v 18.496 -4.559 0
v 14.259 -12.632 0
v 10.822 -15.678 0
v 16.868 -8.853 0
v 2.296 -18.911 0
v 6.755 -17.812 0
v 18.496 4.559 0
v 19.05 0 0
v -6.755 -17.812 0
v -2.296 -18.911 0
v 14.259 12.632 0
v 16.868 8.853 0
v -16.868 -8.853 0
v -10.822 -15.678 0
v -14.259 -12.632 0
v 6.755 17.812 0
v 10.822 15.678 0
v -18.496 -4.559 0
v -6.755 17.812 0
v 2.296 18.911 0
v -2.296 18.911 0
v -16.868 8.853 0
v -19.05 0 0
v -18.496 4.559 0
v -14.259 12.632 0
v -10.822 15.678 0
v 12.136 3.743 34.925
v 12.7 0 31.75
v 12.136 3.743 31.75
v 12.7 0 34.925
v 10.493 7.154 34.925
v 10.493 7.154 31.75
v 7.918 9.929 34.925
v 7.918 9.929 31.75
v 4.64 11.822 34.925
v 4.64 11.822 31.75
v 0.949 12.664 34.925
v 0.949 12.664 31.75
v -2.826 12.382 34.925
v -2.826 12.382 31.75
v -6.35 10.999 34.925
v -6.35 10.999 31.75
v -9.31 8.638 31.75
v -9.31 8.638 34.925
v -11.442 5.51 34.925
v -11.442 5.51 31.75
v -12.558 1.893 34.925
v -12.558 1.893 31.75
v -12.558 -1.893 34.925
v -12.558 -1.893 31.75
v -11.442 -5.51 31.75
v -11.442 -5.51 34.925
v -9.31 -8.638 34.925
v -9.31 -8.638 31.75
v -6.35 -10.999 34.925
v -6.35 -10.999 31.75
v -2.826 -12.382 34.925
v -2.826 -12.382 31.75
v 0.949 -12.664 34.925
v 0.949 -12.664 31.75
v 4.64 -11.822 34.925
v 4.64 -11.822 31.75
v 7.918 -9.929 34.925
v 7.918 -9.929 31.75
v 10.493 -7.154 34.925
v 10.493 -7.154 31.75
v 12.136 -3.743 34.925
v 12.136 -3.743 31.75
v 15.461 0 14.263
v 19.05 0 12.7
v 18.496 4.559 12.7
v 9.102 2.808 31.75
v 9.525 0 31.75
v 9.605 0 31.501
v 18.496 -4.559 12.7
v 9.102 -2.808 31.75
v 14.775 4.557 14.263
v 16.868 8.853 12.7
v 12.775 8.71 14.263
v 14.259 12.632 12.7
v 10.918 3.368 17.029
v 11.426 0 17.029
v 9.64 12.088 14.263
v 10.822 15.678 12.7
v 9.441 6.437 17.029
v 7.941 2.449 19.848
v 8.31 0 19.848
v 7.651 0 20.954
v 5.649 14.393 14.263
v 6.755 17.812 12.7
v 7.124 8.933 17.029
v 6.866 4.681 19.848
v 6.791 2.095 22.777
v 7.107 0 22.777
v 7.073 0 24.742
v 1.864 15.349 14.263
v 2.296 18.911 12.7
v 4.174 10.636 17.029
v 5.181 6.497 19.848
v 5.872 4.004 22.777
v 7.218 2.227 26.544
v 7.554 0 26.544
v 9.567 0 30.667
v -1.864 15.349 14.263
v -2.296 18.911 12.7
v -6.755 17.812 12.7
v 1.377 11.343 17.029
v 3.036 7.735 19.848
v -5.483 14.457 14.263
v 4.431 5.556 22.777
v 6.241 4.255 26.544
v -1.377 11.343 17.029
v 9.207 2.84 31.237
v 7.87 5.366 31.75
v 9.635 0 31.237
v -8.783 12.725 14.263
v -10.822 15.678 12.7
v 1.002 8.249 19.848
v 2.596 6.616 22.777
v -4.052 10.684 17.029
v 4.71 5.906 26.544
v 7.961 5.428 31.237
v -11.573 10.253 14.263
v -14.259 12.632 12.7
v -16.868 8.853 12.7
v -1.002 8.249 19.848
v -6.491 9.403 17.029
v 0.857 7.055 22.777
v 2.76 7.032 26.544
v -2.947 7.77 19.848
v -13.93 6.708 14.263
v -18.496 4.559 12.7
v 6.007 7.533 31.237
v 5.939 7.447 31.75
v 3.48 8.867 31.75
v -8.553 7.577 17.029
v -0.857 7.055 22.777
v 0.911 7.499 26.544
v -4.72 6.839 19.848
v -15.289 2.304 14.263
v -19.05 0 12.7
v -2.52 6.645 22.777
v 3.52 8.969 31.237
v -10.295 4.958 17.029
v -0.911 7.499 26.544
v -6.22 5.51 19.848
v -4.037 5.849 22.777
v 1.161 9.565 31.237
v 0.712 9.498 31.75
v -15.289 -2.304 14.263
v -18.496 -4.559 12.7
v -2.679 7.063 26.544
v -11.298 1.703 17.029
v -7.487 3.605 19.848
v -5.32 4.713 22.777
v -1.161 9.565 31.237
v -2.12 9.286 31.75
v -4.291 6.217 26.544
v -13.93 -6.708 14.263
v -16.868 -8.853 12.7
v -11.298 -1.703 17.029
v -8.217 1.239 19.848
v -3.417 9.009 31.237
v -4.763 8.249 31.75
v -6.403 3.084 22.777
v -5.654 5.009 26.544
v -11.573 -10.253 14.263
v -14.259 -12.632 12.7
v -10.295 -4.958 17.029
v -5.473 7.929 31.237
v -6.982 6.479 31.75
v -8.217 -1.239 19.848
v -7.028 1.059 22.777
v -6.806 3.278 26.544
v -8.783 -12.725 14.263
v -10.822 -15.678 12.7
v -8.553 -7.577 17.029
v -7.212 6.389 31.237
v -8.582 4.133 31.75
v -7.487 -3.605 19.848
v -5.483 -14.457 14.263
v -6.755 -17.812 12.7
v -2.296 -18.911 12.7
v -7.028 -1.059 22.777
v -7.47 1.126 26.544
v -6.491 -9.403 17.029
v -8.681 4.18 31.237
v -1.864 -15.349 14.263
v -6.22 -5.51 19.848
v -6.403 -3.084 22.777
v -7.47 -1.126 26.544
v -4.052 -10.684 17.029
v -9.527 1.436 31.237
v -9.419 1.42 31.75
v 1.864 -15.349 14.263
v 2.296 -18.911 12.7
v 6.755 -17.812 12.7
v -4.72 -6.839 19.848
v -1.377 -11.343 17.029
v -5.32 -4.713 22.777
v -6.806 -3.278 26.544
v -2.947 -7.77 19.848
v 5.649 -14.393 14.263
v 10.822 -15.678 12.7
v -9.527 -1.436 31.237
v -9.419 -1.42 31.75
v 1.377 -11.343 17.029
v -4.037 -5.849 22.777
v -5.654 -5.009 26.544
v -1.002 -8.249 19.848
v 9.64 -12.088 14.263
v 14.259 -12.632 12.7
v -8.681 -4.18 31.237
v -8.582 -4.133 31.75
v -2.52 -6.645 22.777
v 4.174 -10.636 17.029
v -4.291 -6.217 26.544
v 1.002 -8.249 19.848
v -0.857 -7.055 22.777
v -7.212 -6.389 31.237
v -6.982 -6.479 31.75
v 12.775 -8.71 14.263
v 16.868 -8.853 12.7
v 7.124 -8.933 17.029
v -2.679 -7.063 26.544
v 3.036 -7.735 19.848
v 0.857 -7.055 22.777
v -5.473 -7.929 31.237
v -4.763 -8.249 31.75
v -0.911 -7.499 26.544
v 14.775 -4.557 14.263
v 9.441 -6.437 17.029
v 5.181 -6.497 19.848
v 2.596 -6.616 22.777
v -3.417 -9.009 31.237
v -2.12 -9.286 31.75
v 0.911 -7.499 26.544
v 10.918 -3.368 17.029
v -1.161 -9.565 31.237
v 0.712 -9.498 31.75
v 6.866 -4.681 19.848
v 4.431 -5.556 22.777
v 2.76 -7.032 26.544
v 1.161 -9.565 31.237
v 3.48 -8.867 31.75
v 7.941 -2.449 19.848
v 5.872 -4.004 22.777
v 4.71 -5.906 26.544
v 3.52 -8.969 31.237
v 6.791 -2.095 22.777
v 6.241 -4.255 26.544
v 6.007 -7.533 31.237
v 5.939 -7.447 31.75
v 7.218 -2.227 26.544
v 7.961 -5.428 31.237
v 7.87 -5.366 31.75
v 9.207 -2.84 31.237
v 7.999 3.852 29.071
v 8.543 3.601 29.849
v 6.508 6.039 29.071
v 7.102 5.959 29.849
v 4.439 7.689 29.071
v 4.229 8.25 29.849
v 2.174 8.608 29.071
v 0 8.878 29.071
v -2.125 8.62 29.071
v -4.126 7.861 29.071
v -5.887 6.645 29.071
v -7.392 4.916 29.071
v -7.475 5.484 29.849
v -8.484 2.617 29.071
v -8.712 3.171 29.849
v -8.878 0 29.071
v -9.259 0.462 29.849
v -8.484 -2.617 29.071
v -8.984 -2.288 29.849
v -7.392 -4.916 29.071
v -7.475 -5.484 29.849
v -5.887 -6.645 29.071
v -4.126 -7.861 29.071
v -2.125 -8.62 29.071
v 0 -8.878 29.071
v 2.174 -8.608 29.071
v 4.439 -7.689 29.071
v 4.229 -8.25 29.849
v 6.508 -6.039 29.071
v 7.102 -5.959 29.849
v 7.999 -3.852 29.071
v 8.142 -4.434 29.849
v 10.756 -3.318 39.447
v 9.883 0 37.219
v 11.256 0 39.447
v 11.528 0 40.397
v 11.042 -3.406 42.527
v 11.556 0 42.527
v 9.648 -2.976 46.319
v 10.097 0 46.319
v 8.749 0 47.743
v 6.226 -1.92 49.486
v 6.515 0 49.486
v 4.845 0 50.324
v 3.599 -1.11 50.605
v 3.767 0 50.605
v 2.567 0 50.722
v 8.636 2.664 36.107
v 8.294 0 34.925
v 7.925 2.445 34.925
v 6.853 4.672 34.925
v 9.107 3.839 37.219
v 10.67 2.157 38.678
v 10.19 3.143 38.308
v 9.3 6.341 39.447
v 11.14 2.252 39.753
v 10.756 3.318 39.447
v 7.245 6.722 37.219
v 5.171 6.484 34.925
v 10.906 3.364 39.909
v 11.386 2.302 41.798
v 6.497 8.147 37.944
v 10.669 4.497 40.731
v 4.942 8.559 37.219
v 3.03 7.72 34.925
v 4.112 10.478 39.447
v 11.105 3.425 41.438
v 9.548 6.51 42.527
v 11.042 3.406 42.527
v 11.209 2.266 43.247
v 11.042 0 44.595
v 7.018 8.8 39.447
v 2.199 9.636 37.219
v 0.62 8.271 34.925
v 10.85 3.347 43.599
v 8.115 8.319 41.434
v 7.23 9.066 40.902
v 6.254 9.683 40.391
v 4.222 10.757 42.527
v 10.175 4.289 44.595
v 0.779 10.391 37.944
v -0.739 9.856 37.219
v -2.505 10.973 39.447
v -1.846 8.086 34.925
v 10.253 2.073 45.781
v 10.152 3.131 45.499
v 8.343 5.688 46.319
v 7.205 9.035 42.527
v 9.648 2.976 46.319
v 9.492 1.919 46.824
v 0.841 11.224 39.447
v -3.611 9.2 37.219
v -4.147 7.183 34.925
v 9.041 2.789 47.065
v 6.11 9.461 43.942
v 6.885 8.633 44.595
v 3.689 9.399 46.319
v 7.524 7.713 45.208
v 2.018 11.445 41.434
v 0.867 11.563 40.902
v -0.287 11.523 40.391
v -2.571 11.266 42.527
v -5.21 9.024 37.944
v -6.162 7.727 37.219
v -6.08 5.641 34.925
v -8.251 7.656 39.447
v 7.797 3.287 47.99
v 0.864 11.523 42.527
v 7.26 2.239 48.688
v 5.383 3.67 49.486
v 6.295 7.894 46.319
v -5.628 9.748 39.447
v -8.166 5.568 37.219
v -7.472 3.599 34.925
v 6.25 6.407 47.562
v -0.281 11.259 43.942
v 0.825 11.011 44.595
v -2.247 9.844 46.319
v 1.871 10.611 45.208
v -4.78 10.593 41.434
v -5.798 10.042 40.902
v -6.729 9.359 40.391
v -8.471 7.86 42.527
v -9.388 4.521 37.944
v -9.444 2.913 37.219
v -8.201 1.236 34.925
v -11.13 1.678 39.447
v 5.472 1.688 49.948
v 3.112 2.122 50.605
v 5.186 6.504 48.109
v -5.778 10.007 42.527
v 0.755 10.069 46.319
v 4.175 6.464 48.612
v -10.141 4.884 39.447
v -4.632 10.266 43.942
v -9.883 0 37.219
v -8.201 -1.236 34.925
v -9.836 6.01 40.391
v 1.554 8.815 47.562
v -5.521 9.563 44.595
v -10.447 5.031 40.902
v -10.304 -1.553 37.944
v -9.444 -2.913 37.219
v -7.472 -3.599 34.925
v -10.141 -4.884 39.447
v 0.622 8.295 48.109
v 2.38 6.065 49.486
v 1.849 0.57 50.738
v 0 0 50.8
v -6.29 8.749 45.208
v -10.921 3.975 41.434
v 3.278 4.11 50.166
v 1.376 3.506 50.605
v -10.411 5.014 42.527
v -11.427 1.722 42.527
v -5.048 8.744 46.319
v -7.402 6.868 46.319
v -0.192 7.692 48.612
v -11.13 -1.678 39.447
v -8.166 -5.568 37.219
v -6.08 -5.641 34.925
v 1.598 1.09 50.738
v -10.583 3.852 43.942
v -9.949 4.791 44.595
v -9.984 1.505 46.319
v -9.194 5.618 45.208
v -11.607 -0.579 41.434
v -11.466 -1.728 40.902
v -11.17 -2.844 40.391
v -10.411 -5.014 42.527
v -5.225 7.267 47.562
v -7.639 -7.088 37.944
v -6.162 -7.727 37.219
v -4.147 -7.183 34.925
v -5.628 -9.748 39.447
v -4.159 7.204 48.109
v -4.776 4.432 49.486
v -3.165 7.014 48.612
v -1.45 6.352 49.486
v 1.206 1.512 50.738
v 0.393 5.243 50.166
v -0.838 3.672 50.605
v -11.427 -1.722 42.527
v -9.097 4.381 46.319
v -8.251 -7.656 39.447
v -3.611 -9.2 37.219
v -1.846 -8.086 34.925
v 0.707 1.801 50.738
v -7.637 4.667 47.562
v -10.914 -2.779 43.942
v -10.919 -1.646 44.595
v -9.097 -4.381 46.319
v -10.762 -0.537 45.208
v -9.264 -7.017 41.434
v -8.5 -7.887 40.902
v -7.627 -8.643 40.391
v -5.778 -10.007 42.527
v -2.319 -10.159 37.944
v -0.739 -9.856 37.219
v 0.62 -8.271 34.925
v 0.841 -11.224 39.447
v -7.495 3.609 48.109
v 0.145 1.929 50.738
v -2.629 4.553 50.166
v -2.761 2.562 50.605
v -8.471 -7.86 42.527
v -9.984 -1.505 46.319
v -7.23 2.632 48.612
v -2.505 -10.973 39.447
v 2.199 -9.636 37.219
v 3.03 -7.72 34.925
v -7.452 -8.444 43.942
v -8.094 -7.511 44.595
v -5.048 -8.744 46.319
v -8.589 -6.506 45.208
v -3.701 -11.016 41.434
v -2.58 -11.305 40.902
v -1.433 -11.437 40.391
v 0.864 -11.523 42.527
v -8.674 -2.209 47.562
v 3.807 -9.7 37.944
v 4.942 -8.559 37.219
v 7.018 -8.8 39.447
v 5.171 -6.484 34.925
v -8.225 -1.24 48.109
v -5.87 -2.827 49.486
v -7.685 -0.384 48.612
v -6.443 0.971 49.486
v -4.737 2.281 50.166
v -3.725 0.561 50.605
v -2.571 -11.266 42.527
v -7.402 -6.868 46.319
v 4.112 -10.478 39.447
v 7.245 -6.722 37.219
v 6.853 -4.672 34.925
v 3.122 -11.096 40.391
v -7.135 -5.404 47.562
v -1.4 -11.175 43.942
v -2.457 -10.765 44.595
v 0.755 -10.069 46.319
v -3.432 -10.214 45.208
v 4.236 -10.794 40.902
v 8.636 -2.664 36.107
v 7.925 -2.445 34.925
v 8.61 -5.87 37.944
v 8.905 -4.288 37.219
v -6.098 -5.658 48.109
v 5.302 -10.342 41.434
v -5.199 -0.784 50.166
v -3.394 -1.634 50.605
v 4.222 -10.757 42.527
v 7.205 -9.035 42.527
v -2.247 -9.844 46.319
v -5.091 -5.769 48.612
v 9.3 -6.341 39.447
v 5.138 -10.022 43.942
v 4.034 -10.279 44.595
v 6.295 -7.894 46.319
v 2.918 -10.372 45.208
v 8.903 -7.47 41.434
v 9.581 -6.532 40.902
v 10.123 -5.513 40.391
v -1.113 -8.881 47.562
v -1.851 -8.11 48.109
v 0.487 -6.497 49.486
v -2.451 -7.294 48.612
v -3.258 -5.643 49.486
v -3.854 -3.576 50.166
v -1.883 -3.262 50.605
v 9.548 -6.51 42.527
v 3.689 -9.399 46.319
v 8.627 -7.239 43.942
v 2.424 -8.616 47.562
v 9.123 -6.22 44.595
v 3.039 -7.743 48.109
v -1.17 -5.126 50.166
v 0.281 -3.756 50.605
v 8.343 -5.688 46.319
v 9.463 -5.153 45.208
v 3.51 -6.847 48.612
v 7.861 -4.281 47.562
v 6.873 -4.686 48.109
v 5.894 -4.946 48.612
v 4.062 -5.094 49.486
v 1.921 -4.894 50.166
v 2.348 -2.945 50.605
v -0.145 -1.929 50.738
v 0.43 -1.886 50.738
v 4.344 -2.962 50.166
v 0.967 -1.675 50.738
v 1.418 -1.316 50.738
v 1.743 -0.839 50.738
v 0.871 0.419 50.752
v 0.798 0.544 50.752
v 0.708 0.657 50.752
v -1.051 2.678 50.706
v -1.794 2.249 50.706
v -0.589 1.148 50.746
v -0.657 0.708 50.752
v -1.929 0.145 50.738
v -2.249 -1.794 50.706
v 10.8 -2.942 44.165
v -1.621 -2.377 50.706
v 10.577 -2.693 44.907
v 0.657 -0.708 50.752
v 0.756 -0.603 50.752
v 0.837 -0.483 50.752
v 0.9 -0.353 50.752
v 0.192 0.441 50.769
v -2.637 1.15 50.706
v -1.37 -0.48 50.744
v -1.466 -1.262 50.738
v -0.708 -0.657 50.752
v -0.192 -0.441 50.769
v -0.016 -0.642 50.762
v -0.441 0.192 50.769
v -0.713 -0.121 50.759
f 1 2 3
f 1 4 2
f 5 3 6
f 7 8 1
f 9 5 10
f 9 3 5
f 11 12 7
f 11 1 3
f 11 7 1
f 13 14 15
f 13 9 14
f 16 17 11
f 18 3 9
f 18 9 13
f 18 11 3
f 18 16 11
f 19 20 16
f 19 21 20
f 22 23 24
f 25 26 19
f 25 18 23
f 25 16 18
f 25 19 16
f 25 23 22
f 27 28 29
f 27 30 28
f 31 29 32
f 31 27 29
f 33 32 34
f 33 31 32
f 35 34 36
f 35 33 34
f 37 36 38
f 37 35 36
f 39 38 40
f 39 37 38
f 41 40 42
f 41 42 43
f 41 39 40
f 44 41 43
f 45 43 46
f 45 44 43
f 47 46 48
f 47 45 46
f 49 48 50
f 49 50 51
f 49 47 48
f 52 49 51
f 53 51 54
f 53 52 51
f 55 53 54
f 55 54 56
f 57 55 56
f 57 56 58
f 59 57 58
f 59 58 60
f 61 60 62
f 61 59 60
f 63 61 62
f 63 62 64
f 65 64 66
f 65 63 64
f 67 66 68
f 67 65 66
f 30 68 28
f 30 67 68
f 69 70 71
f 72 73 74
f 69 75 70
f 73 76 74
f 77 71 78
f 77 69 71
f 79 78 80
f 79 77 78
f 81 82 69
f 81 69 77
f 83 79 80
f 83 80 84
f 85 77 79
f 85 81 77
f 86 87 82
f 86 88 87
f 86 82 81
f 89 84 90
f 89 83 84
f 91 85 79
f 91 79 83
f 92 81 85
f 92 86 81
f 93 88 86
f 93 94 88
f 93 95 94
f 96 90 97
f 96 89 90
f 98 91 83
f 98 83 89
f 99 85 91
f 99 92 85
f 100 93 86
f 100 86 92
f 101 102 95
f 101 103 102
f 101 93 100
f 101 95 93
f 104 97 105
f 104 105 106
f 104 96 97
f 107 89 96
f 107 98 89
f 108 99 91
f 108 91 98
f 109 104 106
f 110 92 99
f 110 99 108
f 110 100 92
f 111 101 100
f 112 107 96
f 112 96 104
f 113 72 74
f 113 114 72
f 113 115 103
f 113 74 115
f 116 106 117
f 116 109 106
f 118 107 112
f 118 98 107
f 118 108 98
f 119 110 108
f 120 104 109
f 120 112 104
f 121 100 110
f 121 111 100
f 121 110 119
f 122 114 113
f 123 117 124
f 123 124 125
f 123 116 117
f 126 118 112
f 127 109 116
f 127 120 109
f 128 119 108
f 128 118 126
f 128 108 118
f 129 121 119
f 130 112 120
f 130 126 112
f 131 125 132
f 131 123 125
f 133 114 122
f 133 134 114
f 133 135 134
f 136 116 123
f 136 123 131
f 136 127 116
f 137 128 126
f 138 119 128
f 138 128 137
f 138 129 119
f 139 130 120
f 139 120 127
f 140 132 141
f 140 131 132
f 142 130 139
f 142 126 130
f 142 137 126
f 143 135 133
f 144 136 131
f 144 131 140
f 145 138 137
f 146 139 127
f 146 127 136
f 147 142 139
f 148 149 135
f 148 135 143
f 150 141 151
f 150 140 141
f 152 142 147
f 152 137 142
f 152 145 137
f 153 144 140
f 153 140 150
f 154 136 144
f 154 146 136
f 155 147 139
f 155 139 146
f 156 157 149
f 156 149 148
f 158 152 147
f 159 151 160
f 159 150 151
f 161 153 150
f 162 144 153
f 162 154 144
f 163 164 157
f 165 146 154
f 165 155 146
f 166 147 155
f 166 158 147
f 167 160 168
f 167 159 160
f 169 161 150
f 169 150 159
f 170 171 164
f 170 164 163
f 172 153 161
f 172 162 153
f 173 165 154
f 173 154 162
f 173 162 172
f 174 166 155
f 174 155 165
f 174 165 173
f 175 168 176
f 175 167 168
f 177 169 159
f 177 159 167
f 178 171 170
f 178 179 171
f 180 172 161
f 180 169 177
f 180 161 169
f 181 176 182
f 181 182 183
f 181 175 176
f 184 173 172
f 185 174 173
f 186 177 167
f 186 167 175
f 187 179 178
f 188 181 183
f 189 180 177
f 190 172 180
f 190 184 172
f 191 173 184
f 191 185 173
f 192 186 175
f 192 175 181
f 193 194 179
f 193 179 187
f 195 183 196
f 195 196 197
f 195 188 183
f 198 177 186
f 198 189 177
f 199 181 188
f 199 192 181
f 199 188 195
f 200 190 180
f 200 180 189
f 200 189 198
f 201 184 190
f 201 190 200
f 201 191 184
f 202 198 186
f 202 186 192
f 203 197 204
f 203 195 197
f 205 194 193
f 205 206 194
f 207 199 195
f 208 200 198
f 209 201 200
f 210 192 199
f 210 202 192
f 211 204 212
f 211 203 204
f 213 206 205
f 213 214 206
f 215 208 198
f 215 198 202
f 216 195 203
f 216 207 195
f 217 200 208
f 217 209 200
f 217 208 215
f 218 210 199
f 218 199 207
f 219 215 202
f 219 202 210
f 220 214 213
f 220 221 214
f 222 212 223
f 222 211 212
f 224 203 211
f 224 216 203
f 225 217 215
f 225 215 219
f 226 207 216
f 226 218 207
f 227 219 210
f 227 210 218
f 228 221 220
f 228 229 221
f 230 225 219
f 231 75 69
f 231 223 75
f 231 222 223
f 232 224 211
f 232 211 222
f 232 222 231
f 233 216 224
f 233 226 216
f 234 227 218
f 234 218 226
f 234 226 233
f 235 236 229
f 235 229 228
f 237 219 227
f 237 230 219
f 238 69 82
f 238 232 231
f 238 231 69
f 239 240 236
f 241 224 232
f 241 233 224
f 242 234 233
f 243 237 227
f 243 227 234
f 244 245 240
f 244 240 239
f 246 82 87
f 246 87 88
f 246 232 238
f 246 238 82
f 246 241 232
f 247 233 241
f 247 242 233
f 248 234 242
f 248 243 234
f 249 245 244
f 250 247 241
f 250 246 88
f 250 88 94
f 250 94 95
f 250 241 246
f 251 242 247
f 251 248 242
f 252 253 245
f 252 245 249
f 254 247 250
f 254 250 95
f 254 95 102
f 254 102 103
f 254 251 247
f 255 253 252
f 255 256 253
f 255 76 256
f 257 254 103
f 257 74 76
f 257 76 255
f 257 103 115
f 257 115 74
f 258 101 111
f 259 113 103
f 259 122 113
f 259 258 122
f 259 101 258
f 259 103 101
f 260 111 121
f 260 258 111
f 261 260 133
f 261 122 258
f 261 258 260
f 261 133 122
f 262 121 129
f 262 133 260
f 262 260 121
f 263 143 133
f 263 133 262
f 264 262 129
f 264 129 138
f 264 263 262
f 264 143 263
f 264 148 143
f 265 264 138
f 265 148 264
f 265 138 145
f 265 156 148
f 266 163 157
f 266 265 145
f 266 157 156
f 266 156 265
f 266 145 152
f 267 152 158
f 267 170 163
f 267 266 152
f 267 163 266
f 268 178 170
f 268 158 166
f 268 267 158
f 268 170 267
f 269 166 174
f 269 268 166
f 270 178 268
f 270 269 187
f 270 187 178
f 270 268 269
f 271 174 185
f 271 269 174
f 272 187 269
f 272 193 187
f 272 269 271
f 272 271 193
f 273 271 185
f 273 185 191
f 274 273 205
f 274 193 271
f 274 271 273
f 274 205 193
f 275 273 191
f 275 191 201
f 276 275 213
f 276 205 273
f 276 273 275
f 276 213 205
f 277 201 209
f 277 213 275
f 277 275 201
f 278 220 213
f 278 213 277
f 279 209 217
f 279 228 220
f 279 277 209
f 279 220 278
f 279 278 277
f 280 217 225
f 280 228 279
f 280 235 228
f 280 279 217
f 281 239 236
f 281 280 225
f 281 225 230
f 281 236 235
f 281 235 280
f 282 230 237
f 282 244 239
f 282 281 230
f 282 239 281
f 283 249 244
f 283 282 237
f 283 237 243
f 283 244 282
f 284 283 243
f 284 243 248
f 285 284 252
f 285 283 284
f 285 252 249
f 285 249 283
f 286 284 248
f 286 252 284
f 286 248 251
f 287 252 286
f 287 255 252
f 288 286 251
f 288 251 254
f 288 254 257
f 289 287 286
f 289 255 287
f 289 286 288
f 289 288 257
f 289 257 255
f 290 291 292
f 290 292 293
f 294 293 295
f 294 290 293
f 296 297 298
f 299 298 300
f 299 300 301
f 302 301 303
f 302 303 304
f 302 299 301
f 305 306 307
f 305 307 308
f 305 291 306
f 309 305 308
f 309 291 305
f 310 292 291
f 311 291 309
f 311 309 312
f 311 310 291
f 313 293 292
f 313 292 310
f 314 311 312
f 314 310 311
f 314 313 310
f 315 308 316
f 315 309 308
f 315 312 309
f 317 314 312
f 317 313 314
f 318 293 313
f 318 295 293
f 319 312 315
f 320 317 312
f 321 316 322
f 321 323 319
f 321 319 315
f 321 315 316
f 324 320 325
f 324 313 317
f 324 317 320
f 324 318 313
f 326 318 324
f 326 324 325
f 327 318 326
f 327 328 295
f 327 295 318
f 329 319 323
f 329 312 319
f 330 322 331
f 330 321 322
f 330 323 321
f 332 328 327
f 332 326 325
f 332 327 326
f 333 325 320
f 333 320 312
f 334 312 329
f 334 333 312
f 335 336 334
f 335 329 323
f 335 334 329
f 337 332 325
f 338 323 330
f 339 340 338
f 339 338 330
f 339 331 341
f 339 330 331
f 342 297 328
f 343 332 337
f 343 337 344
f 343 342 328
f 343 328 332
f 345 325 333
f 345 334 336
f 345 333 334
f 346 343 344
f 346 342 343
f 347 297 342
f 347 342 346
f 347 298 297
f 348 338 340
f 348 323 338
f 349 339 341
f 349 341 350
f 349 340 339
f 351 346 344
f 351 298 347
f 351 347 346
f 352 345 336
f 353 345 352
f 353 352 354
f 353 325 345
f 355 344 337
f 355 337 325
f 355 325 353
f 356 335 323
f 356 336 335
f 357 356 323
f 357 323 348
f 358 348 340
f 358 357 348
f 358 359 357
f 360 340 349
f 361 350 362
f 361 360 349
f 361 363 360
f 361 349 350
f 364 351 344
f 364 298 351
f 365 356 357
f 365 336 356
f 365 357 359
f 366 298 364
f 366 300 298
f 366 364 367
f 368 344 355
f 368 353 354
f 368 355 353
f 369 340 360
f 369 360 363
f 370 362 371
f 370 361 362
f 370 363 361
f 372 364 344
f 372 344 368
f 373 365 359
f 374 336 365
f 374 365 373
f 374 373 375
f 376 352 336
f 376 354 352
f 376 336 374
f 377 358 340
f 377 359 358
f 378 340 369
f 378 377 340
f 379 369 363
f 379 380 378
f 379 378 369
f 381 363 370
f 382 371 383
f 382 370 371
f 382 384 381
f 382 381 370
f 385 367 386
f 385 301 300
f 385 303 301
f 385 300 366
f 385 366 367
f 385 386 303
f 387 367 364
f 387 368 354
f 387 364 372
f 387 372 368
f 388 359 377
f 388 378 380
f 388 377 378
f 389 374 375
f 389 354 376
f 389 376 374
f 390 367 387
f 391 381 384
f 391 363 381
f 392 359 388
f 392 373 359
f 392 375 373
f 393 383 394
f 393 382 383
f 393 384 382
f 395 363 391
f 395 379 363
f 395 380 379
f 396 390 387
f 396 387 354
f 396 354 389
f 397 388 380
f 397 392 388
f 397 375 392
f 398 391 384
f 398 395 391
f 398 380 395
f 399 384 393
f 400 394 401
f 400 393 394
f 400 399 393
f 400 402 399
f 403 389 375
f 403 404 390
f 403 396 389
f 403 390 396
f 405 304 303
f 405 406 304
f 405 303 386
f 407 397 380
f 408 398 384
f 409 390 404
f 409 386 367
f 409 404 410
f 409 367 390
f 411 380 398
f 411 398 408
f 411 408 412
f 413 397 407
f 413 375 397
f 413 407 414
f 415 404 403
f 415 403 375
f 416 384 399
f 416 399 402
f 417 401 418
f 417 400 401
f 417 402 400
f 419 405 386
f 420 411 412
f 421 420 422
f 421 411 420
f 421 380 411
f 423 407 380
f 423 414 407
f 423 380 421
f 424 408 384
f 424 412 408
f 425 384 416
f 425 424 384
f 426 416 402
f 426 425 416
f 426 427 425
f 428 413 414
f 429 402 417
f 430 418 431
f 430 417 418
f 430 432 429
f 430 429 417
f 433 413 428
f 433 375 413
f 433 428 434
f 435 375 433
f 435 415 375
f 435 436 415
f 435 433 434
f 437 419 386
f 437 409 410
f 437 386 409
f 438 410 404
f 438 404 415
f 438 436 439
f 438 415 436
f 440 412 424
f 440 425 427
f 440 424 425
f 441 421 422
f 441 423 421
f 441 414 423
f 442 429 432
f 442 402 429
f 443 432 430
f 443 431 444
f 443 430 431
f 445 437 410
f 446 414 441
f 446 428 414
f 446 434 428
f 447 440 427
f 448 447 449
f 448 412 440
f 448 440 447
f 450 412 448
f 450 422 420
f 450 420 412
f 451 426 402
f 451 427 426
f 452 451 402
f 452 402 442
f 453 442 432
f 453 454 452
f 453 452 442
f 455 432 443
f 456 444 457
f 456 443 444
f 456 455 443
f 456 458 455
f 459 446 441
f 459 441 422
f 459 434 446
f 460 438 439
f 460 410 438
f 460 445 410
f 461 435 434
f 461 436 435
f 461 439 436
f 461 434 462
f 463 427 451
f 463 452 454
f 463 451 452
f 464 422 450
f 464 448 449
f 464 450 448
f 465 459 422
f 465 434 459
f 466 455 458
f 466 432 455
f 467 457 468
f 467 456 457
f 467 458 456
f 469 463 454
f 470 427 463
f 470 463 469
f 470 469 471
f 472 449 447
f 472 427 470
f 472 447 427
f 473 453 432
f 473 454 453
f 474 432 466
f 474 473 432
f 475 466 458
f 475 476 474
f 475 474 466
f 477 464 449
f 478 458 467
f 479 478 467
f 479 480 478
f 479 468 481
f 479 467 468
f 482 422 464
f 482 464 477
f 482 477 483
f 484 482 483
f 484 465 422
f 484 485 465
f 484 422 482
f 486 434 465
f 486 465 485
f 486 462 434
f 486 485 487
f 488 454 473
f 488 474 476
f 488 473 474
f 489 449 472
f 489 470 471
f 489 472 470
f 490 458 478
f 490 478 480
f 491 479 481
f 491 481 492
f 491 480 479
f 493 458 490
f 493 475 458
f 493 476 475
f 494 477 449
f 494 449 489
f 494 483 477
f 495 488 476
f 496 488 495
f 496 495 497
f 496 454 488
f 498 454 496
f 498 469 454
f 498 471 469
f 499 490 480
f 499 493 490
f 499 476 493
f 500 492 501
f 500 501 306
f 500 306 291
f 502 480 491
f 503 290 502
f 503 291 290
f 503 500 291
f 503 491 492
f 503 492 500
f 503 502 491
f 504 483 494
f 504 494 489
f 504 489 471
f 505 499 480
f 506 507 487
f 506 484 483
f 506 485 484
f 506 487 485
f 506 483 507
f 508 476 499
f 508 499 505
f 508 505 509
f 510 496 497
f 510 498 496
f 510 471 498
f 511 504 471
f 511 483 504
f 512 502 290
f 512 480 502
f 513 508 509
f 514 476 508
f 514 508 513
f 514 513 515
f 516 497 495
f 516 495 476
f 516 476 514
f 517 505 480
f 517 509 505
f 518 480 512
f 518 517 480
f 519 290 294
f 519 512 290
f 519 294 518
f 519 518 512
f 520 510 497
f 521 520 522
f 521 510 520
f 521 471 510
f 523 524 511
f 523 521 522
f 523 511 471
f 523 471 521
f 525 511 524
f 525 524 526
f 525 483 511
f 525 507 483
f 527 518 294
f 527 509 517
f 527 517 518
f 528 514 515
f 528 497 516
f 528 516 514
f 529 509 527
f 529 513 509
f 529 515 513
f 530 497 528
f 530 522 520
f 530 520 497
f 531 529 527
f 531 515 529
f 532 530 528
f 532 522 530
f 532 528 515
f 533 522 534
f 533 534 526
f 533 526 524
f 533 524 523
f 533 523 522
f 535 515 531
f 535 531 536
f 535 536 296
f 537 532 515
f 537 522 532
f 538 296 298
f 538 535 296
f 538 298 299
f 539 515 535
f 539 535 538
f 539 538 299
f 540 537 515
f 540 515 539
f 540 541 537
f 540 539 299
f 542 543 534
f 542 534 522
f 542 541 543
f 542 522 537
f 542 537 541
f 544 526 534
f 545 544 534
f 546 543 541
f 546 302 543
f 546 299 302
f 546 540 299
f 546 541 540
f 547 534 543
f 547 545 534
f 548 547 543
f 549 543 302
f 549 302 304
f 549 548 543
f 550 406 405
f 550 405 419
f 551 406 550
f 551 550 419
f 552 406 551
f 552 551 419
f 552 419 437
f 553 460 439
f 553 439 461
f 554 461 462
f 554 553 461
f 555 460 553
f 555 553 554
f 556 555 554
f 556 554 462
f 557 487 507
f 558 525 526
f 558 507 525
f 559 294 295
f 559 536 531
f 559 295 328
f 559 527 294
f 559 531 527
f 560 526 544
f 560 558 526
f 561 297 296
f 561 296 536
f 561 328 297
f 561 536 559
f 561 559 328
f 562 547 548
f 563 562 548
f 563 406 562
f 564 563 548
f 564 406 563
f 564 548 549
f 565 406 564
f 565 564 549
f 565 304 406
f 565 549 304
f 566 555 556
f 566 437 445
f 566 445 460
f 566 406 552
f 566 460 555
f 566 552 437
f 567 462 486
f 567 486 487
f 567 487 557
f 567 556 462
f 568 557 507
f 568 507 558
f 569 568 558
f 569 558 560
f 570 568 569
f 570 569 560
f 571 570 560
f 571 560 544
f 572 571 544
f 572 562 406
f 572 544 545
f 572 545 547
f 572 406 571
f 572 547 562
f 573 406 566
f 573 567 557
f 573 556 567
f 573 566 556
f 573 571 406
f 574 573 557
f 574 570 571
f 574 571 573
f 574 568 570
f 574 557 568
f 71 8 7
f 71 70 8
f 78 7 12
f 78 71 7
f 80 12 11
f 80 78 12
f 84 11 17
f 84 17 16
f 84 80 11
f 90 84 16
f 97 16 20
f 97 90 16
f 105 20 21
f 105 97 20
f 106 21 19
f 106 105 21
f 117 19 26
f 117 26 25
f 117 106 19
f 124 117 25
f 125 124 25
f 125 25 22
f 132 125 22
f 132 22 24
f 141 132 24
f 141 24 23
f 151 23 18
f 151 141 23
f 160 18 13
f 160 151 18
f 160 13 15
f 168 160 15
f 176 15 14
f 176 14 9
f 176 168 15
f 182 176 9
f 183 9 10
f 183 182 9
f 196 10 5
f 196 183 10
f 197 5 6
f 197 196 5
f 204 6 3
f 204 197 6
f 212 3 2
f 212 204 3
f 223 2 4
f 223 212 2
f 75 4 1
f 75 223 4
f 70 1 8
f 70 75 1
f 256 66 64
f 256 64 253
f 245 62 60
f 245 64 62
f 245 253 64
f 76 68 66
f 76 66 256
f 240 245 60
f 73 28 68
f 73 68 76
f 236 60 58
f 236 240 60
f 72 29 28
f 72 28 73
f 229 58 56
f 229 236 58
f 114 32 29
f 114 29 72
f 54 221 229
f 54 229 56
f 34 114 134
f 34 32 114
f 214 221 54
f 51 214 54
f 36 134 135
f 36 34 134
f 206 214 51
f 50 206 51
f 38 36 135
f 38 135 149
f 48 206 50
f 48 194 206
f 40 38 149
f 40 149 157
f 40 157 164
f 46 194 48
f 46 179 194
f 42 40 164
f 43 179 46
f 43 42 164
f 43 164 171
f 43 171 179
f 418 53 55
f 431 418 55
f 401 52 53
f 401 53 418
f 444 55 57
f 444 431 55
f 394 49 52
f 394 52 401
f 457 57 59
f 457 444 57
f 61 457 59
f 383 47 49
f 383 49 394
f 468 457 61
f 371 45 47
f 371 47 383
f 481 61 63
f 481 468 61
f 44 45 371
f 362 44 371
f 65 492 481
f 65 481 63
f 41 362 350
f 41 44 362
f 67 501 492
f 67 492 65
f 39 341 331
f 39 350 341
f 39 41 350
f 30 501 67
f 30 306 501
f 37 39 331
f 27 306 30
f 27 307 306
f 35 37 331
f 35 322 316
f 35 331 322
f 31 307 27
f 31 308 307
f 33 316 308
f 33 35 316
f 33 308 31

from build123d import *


with BuildPart() as f1:
    # F0 (on Front) → F1 (revolve)
    with BuildSketch(Plane.XZ):
        Polygon((0, 34.925), (0, 31.75), (9.525, 31.75), (12.7, 31.75), (12.7, 34.925), (8.2938163461, 34.925), align=None)
        with BuildLine():
            Line((0, 50.8), (0, 34.925))
            Line((0, 34.925), (8.2938163461, 34.925))
            add(Edge.make_bspline(
                [(8.2938163461, 34.925), (8.8119155958, 35.9296320353), (10.3377018861, 37.6445575669), (11.8497804306, 40.251445047), (11.4775968675, 43.983221376), (10.0574266195, 46.7037851398), (7.7383380098, 48.5934290358), (5.9489654676, 49.9634460717), (3.4584093672, 50.868512047), (1.1692841349, 50.6999896772), (0, 50.8)],
                knots=[0, 0, 0, 0, 0.1331073225, 0.2566905305, 0.3928132468, 0.5191817197, 0.6423867268, 0.7502366215, 0.865279277, 1, 1, 1, 1], degree=3))
        make_face()
        with BuildLine():
            Line((0, 31.75), (0, 0))
            Line((0, 0), (19.05, 0))
            Line((19.05, 0), (19.05, 12.7))
            add(Edge.make_bspline(
                [(19.05, 12.7), (15.6508699467, 13.689246051), (10.4916904552, 17.7065910039), (7.3409641587, 20.4386906172), (6.3373062495, 26.3121345815), (10.1150269054, 30.4028265886), (9.525, 31.75)],
                knots=[0, 0, 0, 0, 0.3180499089, 0.5206308145, 0.7551272901, 1, 1, 1, 1], degree=3))
            Line((9.525, 31.75), (0, 31.75))
        make_face()
    revolve(axis=Axis((0, 0, 25.4), (0, 0, 1)))


solid = f1.part
